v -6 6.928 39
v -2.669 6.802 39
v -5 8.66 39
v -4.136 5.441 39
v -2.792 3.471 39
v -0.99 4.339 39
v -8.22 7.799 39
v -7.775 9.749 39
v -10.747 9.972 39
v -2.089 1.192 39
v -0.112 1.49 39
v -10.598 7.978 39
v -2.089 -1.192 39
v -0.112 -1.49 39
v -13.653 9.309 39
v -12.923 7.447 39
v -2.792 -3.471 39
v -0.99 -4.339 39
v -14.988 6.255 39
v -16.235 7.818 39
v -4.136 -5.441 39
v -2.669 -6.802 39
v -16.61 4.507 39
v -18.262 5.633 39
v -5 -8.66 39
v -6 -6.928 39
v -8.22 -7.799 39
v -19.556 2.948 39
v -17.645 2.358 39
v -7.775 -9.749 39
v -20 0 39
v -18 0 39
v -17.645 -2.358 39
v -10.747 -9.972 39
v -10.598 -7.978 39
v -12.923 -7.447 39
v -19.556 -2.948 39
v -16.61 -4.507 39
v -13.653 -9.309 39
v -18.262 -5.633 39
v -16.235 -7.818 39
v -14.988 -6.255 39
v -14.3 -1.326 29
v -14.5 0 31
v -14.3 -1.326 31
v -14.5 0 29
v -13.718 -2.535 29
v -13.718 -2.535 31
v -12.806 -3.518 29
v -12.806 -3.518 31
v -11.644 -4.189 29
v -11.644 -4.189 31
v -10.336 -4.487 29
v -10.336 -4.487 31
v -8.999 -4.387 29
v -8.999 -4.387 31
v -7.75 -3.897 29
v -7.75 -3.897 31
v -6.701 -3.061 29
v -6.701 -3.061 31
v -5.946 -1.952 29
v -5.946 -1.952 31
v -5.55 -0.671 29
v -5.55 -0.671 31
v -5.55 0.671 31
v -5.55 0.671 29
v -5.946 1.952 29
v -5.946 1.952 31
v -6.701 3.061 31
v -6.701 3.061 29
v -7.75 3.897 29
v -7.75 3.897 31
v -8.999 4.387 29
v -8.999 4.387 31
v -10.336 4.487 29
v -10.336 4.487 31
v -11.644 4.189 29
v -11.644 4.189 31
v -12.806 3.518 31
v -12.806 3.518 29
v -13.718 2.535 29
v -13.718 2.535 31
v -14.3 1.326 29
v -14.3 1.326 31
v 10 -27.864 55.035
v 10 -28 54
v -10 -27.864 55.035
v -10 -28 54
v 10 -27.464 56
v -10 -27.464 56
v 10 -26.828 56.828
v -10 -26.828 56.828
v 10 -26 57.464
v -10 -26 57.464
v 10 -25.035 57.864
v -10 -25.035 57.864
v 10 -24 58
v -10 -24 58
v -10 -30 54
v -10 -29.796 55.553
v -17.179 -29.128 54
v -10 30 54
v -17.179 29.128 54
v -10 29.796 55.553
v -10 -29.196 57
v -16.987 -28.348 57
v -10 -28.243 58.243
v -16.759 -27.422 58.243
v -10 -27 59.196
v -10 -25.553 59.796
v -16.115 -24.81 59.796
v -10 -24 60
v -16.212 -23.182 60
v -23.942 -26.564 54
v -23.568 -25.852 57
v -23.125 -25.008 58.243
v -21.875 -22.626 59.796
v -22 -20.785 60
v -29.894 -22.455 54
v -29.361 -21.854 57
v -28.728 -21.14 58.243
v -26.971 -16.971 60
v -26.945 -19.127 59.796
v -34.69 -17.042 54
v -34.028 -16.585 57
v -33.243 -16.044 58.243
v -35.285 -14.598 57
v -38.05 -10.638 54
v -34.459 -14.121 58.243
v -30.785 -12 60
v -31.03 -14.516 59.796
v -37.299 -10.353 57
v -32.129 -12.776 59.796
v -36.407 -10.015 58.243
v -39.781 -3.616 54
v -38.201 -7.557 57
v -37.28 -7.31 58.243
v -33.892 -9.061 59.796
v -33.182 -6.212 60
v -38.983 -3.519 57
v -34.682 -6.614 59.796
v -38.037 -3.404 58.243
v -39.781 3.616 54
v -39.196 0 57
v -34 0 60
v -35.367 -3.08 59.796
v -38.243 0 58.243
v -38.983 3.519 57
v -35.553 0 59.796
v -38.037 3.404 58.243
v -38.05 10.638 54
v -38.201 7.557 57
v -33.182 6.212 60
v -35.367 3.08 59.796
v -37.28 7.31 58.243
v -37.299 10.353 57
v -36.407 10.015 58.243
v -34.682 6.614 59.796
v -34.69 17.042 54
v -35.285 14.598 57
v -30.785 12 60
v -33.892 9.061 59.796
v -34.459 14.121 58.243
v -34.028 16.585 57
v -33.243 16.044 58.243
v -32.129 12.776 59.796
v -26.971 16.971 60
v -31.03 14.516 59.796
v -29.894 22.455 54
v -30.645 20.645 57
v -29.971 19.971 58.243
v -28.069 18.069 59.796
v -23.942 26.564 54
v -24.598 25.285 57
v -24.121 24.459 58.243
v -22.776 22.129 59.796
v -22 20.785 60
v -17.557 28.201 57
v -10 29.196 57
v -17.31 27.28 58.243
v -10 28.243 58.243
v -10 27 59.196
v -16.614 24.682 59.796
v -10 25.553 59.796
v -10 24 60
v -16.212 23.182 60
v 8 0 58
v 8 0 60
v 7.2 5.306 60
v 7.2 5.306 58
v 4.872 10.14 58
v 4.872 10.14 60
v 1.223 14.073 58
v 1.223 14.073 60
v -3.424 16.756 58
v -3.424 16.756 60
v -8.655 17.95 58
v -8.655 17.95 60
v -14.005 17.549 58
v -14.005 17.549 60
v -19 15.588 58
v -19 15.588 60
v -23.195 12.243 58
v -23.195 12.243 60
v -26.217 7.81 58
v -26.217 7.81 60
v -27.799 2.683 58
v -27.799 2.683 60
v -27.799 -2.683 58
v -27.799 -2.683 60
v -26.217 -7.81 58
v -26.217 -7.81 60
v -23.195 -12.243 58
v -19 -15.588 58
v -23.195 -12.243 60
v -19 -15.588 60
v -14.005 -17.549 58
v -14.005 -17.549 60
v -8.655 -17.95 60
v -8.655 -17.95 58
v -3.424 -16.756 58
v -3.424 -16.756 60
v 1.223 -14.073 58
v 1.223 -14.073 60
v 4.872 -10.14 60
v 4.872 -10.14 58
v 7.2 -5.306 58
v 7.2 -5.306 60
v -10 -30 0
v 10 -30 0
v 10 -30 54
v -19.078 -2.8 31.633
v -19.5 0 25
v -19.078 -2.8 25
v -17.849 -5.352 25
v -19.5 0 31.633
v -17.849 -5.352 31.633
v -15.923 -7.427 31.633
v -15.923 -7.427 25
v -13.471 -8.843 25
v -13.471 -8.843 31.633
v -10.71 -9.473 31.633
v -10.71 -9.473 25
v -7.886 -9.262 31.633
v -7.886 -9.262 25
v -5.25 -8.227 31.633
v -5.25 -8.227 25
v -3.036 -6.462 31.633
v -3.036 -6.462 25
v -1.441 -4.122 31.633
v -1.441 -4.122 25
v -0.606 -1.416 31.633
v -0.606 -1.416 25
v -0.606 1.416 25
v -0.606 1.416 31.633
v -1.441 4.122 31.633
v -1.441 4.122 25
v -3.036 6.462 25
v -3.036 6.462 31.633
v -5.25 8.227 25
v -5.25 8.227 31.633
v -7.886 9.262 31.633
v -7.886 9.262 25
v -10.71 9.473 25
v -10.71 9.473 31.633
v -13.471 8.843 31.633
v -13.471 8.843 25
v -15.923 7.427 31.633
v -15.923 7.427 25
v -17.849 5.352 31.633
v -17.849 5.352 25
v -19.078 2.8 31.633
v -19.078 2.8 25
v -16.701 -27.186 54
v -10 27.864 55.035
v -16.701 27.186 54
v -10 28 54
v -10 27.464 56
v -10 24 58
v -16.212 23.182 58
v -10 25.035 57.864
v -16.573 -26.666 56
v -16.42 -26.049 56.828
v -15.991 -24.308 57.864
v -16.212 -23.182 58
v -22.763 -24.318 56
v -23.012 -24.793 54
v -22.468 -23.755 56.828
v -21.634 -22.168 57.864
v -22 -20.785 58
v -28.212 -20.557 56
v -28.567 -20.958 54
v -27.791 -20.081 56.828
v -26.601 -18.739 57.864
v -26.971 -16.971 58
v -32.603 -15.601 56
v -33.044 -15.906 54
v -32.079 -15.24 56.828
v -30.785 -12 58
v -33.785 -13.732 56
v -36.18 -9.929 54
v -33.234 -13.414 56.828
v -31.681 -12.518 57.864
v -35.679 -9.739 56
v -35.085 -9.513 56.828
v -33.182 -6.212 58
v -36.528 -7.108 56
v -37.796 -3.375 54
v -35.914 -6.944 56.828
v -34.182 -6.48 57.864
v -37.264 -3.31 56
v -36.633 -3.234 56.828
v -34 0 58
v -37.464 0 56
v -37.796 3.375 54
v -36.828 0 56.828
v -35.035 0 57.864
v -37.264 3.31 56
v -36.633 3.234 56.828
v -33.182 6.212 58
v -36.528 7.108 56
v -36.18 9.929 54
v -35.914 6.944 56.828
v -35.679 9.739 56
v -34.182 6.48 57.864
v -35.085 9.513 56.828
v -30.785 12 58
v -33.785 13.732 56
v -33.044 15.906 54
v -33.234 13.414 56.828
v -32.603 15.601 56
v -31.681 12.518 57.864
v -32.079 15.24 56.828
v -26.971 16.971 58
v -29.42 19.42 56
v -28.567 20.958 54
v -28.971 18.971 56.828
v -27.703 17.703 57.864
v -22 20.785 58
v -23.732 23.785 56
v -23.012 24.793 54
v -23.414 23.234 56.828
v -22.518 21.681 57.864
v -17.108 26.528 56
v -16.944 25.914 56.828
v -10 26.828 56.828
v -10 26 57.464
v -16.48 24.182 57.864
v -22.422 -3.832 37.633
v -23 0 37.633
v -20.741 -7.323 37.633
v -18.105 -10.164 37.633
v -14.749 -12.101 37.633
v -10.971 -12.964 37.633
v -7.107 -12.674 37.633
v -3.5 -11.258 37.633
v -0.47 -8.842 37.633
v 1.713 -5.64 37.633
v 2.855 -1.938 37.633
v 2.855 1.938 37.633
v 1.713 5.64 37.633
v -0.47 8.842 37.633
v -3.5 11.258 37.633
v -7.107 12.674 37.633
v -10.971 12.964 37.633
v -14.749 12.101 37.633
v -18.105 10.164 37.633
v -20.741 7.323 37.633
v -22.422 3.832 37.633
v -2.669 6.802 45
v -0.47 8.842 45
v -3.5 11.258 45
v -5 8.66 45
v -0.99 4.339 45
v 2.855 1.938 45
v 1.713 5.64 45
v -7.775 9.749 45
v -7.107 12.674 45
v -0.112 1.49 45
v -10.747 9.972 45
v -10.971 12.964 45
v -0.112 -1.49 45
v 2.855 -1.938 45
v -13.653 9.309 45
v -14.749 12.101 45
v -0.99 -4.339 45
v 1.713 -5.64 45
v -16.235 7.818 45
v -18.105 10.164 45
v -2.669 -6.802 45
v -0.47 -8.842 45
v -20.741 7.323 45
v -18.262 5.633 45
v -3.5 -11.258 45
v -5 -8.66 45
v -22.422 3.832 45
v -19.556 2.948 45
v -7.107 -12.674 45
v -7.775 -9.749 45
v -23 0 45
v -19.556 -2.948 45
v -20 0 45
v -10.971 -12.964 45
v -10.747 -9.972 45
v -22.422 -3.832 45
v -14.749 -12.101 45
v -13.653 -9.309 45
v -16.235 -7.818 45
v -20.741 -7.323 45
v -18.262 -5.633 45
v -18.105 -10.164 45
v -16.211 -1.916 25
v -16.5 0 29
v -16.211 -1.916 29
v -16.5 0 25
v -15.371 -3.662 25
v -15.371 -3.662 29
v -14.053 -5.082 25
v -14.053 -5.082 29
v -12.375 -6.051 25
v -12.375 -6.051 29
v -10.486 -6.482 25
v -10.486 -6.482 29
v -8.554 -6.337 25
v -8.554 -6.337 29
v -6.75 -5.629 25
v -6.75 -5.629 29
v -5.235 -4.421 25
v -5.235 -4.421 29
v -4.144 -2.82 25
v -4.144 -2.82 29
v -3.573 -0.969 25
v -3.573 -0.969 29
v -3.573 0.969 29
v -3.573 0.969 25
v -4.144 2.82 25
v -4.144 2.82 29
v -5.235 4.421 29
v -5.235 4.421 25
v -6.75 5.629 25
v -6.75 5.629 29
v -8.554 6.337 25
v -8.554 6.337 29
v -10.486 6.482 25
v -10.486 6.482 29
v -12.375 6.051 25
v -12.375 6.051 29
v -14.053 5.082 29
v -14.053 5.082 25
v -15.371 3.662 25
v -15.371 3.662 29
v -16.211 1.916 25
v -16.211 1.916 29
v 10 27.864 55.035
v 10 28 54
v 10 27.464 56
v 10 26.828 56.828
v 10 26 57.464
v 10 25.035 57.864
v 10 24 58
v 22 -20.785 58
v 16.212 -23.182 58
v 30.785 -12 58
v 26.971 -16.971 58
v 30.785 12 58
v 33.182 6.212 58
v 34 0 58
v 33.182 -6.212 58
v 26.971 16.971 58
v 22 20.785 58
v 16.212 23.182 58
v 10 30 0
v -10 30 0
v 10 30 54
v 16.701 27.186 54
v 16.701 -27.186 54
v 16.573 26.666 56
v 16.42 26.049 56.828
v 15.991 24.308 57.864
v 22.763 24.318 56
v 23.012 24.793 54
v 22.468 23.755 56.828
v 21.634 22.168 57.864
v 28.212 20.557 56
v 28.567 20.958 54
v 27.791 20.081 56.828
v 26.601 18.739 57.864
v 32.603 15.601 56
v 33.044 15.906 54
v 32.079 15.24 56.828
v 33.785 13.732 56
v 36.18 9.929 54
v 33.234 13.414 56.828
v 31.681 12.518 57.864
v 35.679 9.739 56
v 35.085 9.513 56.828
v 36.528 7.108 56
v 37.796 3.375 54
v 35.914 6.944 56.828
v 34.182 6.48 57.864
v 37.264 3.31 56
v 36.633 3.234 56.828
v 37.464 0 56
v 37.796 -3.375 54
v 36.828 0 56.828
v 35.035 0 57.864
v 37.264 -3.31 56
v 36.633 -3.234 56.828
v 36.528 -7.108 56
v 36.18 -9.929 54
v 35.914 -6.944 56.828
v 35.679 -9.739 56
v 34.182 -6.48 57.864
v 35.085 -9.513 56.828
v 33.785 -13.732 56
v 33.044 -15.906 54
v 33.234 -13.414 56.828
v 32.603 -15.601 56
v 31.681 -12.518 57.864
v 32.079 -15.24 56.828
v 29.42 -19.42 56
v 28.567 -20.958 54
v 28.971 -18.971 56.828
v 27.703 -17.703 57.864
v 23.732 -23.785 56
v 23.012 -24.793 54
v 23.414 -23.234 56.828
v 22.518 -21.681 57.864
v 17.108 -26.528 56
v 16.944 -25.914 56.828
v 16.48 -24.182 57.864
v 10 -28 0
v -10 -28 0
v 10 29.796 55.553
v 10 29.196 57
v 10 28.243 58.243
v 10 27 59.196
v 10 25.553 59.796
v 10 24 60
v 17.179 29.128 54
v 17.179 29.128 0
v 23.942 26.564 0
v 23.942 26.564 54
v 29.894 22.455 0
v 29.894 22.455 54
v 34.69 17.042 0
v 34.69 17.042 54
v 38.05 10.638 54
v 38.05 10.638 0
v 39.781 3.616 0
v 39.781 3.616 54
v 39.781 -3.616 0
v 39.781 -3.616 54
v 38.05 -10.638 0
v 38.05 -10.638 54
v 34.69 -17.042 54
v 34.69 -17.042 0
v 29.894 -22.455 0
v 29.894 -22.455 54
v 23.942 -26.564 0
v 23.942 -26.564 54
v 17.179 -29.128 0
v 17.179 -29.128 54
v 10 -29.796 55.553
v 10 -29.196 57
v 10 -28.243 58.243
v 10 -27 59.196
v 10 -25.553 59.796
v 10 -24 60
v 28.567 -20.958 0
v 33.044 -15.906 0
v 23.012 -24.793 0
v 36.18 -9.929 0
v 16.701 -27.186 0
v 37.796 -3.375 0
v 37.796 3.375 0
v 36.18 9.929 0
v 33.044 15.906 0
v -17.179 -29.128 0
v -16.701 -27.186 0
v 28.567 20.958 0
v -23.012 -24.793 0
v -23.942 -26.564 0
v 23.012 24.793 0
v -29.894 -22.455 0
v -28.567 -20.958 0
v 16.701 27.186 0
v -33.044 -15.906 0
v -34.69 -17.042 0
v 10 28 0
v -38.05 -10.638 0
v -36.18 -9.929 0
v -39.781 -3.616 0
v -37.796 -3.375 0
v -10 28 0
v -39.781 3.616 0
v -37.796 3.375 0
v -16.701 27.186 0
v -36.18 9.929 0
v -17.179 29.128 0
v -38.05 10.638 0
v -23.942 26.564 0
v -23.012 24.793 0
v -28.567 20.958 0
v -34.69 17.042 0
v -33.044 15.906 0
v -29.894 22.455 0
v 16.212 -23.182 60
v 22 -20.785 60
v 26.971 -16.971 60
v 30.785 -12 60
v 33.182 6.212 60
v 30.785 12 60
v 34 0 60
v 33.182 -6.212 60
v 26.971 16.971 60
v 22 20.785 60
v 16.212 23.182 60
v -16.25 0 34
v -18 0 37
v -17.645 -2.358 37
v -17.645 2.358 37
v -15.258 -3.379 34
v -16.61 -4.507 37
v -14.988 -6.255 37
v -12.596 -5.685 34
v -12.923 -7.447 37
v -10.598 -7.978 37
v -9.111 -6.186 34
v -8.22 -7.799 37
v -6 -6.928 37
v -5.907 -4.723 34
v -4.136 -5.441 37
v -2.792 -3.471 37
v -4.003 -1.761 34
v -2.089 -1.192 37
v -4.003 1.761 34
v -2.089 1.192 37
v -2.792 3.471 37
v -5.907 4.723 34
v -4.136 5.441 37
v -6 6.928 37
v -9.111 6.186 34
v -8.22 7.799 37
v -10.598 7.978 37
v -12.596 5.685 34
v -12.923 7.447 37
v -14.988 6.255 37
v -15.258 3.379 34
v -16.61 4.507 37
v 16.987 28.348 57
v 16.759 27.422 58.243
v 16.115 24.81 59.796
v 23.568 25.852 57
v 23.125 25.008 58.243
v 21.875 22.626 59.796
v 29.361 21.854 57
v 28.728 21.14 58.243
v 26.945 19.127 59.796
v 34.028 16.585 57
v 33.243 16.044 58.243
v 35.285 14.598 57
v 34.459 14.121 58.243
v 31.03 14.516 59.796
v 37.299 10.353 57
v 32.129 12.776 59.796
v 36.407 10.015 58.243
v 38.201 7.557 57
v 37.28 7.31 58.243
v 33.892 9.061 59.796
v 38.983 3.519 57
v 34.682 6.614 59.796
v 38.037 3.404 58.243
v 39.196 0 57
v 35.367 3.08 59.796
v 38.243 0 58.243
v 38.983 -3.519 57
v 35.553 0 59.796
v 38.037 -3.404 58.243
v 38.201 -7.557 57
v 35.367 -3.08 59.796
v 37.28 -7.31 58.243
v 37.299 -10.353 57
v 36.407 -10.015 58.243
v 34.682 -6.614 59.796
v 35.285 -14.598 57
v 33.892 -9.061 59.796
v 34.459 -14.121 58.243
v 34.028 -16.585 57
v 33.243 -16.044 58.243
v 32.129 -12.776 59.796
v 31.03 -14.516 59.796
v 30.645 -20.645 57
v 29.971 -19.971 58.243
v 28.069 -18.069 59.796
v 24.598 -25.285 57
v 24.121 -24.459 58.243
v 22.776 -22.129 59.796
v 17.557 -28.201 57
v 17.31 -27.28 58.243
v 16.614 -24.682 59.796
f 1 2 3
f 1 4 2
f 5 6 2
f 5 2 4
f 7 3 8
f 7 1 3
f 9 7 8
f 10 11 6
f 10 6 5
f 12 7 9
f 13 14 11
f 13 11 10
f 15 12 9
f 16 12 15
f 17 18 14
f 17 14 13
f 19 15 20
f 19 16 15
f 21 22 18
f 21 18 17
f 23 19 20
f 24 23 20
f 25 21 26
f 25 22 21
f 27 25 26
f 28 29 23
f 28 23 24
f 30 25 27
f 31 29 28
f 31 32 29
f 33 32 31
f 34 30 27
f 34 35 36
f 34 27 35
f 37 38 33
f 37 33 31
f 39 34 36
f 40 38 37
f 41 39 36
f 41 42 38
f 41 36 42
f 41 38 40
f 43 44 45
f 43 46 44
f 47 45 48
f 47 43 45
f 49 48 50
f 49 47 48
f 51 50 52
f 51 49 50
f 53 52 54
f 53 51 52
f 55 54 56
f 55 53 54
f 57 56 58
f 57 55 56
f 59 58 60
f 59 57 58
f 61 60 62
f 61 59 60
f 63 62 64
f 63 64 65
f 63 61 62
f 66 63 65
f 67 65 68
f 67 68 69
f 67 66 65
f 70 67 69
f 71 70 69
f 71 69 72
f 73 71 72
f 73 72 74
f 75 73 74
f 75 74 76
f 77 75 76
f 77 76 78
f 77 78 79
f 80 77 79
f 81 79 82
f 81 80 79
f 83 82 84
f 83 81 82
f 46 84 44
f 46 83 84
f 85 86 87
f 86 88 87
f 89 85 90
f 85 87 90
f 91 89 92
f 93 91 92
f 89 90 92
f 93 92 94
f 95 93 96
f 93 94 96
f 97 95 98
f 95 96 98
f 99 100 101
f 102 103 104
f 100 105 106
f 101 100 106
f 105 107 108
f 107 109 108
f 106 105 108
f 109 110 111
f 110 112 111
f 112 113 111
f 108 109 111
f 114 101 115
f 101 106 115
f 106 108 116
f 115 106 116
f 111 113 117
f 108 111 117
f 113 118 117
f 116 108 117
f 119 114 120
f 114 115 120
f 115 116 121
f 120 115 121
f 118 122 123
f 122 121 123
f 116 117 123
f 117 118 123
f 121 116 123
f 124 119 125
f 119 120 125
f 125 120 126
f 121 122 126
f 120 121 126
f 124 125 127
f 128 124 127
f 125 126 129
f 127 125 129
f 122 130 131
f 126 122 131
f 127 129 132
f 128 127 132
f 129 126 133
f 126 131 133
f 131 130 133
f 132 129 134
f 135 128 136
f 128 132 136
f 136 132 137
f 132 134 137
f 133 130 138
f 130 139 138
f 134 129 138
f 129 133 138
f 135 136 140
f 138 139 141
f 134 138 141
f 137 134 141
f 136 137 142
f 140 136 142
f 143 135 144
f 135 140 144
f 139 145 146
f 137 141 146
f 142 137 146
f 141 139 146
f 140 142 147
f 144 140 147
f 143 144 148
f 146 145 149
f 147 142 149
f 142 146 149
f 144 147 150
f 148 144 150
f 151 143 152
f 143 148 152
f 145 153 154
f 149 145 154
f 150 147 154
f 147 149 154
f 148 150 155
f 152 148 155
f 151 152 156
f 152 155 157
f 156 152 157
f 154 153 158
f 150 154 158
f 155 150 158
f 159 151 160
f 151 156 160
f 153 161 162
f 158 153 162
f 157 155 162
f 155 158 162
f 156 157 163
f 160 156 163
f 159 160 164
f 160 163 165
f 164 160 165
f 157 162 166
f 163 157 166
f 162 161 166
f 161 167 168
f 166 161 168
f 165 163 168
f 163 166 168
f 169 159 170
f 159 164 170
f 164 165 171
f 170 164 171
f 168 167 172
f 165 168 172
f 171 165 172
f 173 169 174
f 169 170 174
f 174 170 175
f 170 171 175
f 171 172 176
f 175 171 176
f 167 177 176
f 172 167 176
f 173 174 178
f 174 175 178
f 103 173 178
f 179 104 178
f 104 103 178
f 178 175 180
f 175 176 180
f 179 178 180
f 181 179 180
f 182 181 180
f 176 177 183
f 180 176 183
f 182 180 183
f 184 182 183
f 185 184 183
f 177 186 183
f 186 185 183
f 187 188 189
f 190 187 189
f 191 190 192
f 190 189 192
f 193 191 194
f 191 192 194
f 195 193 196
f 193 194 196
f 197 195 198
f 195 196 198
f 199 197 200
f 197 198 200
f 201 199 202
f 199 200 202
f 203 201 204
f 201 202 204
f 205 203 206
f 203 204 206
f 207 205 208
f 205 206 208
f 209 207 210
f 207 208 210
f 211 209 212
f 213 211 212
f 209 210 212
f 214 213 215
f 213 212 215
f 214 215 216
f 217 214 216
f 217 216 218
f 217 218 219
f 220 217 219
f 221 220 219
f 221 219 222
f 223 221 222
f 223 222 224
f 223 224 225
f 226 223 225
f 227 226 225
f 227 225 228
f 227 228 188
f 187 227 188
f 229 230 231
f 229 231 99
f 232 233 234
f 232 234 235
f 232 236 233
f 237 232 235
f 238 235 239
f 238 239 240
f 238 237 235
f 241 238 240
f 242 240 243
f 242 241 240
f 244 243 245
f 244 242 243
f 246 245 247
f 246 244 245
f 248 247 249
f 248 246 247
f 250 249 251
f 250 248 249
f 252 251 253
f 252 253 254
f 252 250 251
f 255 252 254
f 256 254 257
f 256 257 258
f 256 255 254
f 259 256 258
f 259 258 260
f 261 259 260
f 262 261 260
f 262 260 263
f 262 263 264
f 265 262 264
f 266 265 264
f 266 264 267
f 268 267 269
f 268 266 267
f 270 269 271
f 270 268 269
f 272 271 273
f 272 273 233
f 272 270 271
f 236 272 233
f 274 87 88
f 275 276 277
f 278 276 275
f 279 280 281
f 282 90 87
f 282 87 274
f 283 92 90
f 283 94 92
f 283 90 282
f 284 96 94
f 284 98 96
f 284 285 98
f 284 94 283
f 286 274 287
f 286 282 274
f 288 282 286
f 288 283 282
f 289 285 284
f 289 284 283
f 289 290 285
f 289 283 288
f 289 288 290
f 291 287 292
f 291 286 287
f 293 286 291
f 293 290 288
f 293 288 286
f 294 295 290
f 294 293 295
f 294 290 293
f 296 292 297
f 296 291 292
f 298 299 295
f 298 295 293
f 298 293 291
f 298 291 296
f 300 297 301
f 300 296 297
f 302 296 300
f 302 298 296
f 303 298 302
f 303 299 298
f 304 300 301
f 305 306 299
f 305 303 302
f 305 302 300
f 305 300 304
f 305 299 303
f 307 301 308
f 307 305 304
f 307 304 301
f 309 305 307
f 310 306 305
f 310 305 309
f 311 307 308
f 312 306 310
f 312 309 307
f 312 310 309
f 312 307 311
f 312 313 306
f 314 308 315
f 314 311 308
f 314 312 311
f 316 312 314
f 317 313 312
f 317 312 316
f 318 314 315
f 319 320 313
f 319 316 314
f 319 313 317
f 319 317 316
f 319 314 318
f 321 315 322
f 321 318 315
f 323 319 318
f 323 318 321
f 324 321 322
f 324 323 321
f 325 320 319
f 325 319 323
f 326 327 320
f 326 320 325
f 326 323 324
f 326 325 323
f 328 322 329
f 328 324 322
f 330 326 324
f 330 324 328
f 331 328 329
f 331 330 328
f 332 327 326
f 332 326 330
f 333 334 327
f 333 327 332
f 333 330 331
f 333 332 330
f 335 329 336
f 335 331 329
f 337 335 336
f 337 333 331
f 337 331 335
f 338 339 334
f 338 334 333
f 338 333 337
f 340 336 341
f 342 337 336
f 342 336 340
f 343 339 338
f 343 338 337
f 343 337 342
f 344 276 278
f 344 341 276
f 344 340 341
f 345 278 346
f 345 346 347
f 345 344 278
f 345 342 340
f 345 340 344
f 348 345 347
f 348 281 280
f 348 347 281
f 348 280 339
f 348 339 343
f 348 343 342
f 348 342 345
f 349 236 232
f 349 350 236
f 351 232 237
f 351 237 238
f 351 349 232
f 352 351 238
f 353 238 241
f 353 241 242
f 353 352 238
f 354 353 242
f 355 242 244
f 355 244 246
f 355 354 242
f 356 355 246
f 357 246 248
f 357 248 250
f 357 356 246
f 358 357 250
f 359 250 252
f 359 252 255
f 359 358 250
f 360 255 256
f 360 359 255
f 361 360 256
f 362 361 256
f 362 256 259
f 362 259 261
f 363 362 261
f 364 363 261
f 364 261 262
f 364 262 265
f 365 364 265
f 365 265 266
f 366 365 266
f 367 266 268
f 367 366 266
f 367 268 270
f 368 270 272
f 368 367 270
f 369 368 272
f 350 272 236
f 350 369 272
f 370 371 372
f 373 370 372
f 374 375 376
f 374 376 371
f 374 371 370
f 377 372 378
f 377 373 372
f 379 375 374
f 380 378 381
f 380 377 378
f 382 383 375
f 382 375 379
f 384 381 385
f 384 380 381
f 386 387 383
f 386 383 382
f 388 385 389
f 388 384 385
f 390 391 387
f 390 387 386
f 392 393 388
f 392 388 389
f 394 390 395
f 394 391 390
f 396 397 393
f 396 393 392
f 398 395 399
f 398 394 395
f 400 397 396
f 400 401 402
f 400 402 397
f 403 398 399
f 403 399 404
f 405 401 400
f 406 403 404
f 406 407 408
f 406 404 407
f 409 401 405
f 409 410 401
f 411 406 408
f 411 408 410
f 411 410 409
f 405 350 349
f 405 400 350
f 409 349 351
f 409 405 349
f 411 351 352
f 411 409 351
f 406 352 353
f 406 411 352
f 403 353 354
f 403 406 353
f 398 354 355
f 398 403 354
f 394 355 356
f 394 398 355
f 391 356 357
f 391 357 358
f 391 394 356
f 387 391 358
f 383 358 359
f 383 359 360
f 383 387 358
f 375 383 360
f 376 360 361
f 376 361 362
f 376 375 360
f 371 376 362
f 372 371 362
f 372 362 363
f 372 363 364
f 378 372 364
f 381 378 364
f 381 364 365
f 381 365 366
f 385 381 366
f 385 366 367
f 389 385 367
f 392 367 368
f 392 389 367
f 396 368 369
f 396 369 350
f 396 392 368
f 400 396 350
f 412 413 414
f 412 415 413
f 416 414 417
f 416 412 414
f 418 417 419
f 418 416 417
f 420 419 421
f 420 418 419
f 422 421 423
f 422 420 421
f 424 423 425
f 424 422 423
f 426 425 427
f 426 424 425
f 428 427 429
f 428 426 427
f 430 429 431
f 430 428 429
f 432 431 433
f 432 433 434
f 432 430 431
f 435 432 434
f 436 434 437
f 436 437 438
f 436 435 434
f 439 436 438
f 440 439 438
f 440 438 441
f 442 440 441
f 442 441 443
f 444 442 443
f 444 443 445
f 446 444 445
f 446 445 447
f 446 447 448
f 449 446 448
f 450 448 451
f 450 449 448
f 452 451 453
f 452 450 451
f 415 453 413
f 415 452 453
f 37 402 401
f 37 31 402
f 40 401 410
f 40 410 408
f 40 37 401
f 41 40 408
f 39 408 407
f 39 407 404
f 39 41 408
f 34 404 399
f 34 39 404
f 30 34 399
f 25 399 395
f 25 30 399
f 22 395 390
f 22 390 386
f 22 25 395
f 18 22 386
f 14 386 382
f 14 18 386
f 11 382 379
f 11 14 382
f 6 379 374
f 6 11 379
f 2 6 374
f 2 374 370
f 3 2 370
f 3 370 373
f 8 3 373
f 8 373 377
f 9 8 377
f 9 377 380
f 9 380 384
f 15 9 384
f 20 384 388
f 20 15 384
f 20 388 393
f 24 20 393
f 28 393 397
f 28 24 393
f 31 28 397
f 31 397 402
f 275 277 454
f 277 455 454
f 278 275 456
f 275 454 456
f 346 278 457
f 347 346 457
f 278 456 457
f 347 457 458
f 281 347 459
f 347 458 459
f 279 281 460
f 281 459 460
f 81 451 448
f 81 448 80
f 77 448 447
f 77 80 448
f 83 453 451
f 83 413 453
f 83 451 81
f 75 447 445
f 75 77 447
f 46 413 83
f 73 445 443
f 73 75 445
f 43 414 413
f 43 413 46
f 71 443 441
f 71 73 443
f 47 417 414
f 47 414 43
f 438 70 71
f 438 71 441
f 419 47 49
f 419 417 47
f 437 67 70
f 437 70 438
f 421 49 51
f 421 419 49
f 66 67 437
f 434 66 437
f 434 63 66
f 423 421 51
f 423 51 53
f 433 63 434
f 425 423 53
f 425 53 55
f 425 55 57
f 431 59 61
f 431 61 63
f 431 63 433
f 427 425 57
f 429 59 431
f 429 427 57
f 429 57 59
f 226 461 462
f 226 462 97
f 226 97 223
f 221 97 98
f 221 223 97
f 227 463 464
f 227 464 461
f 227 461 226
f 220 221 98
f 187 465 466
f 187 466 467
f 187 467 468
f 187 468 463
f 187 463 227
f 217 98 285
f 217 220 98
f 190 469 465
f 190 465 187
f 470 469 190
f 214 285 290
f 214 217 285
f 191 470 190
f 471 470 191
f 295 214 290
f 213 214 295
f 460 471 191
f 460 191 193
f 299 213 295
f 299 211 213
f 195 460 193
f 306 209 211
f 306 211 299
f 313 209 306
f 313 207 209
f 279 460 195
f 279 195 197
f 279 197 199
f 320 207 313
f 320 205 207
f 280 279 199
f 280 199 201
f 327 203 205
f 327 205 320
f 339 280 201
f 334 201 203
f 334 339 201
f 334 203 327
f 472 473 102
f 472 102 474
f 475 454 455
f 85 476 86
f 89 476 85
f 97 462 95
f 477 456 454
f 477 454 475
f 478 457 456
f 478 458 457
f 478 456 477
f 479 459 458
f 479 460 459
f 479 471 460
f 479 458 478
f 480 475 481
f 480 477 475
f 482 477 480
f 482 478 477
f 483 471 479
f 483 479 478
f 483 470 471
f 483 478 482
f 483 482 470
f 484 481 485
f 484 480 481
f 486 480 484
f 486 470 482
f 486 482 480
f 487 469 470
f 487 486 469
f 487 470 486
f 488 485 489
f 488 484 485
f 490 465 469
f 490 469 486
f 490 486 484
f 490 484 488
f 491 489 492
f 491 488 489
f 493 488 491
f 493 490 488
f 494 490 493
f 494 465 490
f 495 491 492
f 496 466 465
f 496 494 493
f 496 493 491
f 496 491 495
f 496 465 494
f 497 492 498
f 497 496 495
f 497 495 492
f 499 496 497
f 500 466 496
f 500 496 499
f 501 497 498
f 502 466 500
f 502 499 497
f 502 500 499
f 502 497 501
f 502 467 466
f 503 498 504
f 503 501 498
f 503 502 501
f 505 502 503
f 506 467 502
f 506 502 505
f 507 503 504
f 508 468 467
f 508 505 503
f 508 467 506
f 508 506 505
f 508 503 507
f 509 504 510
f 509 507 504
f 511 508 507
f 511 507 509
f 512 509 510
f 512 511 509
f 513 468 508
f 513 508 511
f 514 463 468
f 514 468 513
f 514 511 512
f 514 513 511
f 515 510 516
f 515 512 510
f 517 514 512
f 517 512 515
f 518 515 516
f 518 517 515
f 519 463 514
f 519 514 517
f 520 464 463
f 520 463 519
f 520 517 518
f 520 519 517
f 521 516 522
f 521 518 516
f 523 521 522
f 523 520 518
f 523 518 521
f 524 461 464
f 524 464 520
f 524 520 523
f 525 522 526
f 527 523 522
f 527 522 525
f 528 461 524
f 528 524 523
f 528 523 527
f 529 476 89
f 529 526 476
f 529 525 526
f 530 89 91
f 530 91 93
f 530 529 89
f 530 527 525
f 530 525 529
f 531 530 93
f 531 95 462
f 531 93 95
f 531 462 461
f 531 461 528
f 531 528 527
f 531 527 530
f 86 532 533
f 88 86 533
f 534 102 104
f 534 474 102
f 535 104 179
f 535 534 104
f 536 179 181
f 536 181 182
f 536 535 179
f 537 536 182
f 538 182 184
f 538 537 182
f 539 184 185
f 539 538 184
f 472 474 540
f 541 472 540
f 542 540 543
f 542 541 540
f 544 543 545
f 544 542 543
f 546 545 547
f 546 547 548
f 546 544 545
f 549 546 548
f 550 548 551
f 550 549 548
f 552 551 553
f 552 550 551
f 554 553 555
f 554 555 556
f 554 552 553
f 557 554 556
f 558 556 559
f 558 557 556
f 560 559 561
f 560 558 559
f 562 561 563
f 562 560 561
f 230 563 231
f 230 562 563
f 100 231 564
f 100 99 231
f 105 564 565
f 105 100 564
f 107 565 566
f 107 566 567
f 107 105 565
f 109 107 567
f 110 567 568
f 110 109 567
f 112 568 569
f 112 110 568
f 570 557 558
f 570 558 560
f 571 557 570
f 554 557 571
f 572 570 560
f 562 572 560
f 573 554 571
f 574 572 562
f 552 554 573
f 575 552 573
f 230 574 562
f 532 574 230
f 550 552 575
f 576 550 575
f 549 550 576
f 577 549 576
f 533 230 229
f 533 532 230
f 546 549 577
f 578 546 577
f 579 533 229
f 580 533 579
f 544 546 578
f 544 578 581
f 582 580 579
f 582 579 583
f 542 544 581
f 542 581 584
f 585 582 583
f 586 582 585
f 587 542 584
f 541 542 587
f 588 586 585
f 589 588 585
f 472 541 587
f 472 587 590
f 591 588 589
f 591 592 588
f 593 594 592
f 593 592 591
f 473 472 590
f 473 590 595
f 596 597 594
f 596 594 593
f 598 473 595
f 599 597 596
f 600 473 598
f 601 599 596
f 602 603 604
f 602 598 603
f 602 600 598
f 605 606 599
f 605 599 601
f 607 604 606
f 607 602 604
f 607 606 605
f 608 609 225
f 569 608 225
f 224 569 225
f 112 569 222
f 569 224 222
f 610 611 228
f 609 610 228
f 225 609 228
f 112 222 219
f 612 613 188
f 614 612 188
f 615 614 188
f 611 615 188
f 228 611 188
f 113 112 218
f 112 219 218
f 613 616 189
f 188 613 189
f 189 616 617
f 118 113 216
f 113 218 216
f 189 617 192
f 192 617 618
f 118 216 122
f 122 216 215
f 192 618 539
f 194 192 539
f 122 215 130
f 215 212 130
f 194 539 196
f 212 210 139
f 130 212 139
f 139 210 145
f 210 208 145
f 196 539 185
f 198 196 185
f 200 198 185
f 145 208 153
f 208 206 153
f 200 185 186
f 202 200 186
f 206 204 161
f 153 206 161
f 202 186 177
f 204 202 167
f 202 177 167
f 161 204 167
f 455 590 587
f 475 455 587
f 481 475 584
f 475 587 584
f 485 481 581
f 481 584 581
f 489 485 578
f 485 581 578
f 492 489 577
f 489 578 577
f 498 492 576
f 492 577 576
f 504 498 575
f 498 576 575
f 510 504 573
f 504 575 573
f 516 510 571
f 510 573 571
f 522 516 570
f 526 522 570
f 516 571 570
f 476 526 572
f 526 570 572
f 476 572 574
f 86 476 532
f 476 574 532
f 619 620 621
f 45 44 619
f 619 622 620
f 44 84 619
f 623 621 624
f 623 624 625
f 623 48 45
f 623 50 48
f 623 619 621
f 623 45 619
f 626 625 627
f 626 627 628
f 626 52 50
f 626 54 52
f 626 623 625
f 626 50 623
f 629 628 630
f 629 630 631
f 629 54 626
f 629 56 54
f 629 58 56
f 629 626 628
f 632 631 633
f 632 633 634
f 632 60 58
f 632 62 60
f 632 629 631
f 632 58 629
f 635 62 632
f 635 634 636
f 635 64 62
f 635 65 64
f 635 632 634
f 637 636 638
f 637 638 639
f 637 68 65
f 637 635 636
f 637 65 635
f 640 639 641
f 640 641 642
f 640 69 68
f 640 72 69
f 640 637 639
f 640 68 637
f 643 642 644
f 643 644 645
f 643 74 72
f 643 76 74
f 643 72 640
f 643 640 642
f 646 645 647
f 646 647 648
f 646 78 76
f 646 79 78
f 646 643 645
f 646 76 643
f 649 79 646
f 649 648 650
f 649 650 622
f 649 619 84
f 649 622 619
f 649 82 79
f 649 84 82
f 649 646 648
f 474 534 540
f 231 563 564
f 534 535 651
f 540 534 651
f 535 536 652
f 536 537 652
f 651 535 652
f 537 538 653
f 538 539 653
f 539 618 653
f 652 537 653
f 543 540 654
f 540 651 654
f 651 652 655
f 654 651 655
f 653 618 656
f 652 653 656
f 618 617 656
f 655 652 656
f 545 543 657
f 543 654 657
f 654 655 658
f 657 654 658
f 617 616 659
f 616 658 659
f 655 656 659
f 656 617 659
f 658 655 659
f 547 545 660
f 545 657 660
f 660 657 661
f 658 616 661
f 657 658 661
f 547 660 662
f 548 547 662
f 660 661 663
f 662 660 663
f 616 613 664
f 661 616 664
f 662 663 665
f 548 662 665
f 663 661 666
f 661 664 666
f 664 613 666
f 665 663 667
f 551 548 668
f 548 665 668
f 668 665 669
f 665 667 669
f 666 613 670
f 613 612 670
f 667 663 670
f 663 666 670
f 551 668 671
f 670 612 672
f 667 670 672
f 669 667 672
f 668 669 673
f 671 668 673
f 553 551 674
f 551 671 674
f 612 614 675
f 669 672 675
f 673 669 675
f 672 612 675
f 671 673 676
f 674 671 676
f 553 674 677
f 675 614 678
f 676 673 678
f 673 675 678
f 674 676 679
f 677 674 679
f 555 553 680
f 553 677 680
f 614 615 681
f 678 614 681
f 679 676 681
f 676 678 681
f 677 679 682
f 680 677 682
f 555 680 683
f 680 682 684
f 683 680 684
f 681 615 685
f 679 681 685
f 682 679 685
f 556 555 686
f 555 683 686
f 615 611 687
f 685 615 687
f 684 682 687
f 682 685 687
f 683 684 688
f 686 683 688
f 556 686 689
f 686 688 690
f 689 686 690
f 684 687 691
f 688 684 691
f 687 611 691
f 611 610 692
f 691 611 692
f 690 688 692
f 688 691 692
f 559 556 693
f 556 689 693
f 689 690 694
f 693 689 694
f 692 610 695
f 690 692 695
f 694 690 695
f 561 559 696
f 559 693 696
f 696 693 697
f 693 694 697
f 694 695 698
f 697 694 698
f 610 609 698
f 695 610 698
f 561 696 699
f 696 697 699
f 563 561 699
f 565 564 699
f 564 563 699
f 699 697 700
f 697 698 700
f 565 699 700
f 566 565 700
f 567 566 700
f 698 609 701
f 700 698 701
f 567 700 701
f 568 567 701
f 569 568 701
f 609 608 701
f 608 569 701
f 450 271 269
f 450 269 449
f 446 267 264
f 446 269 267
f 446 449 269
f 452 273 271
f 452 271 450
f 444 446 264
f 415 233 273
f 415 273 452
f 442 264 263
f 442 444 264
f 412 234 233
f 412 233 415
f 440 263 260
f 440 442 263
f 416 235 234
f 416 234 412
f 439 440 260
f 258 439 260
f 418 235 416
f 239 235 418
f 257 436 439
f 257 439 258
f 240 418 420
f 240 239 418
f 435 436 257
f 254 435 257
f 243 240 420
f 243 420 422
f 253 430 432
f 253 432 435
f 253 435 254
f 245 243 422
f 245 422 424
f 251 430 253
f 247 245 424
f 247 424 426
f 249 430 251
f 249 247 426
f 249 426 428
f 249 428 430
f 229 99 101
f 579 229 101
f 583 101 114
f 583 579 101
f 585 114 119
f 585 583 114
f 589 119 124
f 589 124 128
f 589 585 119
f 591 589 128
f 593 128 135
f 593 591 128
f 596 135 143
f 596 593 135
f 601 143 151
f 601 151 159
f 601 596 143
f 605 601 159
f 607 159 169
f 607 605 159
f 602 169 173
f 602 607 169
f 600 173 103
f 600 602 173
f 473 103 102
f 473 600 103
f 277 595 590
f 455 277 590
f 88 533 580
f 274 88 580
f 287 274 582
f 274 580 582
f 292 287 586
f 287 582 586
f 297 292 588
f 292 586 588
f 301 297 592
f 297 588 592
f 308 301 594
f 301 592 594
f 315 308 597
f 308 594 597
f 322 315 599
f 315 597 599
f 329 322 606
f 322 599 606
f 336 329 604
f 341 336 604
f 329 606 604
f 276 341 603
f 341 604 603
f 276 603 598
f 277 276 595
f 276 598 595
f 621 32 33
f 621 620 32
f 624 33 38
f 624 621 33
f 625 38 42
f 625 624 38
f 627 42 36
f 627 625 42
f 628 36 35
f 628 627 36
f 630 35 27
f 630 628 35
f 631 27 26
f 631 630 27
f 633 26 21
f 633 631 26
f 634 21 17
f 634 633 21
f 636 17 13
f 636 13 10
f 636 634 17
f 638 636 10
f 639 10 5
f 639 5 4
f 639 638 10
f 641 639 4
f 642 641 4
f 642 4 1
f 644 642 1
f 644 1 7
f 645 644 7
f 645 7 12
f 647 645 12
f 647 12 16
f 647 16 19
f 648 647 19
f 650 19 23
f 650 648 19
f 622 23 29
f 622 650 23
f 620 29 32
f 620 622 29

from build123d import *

# Parameters (mm, degrees)
EXTRUDE_1_DEPTH     = 60
FILLET_1_R          = 6
SHELL_1_T           = -2
SKETCH_3_R          = 18
CUT_EXTRUDE_1_DEPTH = 79.102496759


with BuildPart() as part:
    # 草图2 → 凸台-拉伸1 (new body)
    with BuildSketch(Plane.XY):
        with BuildLine():
            Line((-10, 30), (10, 30))
            ThreePointArc((10, 30), (40, 0), (10, -30))
            Line((10, -30), (-10, -30))
            ThreePointArc((-10, -30), (-40, 0), (-10, 30))
        make_face()
    extrude(amount=EXTRUDE_1_DEPTH)

    # 圆角1
    fillet_1_edges = [part.edges().sort_by_distance(p)[0] for p in [
        (40, 0, 60),
        (0, 30, 60),
        (-40, 0, 60),
        (0, -30, 60),
    ]]
    fillet(fillet_1_edges, radius=FILLET_1_R)

    # 抽壳1
    shell_1_openings = [part.faces().sort_by_distance(p)[0] for p in [
        (0, 0, 0),
    ]]
    offset(amount=SHELL_1_T, openings=shell_1_openings, kind=Kind.INTERSECTION)

    # 草图3 → 切除-拉伸1 (cut, through all)
    with BuildSketch(Plane.XY.offset(60)):
        with Locations((-10, 0)):
            Circle(SKETCH_3_R)
    extrude(amount=-CUT_EXTRUDE_1_DEPTH, mode=Mode.SUBTRACT)


with BuildPart() as body_2:
    # 草图4 → 旋转1 (revolve)
    with BuildSketch(Plane(origin=(0, 0, 0), x_dir=(1, 0, 0), z_dir=(0, 1, 0))):
        Polygon((-20, -45), (-20, -39), (-18, -39), (-18, -37), (-14.5, -31), (-14.5, -29), (-16.5, -29), (-16.5, -25), (-19.5, -25), (-19.5, -31.632889149), (-23, -37.632889149), (-23, -45), align=None)
    revolve(axis=Axis((-10, 0, 0), (0, 0, 1)))


solid = Compound([part.part, body_2.part])
